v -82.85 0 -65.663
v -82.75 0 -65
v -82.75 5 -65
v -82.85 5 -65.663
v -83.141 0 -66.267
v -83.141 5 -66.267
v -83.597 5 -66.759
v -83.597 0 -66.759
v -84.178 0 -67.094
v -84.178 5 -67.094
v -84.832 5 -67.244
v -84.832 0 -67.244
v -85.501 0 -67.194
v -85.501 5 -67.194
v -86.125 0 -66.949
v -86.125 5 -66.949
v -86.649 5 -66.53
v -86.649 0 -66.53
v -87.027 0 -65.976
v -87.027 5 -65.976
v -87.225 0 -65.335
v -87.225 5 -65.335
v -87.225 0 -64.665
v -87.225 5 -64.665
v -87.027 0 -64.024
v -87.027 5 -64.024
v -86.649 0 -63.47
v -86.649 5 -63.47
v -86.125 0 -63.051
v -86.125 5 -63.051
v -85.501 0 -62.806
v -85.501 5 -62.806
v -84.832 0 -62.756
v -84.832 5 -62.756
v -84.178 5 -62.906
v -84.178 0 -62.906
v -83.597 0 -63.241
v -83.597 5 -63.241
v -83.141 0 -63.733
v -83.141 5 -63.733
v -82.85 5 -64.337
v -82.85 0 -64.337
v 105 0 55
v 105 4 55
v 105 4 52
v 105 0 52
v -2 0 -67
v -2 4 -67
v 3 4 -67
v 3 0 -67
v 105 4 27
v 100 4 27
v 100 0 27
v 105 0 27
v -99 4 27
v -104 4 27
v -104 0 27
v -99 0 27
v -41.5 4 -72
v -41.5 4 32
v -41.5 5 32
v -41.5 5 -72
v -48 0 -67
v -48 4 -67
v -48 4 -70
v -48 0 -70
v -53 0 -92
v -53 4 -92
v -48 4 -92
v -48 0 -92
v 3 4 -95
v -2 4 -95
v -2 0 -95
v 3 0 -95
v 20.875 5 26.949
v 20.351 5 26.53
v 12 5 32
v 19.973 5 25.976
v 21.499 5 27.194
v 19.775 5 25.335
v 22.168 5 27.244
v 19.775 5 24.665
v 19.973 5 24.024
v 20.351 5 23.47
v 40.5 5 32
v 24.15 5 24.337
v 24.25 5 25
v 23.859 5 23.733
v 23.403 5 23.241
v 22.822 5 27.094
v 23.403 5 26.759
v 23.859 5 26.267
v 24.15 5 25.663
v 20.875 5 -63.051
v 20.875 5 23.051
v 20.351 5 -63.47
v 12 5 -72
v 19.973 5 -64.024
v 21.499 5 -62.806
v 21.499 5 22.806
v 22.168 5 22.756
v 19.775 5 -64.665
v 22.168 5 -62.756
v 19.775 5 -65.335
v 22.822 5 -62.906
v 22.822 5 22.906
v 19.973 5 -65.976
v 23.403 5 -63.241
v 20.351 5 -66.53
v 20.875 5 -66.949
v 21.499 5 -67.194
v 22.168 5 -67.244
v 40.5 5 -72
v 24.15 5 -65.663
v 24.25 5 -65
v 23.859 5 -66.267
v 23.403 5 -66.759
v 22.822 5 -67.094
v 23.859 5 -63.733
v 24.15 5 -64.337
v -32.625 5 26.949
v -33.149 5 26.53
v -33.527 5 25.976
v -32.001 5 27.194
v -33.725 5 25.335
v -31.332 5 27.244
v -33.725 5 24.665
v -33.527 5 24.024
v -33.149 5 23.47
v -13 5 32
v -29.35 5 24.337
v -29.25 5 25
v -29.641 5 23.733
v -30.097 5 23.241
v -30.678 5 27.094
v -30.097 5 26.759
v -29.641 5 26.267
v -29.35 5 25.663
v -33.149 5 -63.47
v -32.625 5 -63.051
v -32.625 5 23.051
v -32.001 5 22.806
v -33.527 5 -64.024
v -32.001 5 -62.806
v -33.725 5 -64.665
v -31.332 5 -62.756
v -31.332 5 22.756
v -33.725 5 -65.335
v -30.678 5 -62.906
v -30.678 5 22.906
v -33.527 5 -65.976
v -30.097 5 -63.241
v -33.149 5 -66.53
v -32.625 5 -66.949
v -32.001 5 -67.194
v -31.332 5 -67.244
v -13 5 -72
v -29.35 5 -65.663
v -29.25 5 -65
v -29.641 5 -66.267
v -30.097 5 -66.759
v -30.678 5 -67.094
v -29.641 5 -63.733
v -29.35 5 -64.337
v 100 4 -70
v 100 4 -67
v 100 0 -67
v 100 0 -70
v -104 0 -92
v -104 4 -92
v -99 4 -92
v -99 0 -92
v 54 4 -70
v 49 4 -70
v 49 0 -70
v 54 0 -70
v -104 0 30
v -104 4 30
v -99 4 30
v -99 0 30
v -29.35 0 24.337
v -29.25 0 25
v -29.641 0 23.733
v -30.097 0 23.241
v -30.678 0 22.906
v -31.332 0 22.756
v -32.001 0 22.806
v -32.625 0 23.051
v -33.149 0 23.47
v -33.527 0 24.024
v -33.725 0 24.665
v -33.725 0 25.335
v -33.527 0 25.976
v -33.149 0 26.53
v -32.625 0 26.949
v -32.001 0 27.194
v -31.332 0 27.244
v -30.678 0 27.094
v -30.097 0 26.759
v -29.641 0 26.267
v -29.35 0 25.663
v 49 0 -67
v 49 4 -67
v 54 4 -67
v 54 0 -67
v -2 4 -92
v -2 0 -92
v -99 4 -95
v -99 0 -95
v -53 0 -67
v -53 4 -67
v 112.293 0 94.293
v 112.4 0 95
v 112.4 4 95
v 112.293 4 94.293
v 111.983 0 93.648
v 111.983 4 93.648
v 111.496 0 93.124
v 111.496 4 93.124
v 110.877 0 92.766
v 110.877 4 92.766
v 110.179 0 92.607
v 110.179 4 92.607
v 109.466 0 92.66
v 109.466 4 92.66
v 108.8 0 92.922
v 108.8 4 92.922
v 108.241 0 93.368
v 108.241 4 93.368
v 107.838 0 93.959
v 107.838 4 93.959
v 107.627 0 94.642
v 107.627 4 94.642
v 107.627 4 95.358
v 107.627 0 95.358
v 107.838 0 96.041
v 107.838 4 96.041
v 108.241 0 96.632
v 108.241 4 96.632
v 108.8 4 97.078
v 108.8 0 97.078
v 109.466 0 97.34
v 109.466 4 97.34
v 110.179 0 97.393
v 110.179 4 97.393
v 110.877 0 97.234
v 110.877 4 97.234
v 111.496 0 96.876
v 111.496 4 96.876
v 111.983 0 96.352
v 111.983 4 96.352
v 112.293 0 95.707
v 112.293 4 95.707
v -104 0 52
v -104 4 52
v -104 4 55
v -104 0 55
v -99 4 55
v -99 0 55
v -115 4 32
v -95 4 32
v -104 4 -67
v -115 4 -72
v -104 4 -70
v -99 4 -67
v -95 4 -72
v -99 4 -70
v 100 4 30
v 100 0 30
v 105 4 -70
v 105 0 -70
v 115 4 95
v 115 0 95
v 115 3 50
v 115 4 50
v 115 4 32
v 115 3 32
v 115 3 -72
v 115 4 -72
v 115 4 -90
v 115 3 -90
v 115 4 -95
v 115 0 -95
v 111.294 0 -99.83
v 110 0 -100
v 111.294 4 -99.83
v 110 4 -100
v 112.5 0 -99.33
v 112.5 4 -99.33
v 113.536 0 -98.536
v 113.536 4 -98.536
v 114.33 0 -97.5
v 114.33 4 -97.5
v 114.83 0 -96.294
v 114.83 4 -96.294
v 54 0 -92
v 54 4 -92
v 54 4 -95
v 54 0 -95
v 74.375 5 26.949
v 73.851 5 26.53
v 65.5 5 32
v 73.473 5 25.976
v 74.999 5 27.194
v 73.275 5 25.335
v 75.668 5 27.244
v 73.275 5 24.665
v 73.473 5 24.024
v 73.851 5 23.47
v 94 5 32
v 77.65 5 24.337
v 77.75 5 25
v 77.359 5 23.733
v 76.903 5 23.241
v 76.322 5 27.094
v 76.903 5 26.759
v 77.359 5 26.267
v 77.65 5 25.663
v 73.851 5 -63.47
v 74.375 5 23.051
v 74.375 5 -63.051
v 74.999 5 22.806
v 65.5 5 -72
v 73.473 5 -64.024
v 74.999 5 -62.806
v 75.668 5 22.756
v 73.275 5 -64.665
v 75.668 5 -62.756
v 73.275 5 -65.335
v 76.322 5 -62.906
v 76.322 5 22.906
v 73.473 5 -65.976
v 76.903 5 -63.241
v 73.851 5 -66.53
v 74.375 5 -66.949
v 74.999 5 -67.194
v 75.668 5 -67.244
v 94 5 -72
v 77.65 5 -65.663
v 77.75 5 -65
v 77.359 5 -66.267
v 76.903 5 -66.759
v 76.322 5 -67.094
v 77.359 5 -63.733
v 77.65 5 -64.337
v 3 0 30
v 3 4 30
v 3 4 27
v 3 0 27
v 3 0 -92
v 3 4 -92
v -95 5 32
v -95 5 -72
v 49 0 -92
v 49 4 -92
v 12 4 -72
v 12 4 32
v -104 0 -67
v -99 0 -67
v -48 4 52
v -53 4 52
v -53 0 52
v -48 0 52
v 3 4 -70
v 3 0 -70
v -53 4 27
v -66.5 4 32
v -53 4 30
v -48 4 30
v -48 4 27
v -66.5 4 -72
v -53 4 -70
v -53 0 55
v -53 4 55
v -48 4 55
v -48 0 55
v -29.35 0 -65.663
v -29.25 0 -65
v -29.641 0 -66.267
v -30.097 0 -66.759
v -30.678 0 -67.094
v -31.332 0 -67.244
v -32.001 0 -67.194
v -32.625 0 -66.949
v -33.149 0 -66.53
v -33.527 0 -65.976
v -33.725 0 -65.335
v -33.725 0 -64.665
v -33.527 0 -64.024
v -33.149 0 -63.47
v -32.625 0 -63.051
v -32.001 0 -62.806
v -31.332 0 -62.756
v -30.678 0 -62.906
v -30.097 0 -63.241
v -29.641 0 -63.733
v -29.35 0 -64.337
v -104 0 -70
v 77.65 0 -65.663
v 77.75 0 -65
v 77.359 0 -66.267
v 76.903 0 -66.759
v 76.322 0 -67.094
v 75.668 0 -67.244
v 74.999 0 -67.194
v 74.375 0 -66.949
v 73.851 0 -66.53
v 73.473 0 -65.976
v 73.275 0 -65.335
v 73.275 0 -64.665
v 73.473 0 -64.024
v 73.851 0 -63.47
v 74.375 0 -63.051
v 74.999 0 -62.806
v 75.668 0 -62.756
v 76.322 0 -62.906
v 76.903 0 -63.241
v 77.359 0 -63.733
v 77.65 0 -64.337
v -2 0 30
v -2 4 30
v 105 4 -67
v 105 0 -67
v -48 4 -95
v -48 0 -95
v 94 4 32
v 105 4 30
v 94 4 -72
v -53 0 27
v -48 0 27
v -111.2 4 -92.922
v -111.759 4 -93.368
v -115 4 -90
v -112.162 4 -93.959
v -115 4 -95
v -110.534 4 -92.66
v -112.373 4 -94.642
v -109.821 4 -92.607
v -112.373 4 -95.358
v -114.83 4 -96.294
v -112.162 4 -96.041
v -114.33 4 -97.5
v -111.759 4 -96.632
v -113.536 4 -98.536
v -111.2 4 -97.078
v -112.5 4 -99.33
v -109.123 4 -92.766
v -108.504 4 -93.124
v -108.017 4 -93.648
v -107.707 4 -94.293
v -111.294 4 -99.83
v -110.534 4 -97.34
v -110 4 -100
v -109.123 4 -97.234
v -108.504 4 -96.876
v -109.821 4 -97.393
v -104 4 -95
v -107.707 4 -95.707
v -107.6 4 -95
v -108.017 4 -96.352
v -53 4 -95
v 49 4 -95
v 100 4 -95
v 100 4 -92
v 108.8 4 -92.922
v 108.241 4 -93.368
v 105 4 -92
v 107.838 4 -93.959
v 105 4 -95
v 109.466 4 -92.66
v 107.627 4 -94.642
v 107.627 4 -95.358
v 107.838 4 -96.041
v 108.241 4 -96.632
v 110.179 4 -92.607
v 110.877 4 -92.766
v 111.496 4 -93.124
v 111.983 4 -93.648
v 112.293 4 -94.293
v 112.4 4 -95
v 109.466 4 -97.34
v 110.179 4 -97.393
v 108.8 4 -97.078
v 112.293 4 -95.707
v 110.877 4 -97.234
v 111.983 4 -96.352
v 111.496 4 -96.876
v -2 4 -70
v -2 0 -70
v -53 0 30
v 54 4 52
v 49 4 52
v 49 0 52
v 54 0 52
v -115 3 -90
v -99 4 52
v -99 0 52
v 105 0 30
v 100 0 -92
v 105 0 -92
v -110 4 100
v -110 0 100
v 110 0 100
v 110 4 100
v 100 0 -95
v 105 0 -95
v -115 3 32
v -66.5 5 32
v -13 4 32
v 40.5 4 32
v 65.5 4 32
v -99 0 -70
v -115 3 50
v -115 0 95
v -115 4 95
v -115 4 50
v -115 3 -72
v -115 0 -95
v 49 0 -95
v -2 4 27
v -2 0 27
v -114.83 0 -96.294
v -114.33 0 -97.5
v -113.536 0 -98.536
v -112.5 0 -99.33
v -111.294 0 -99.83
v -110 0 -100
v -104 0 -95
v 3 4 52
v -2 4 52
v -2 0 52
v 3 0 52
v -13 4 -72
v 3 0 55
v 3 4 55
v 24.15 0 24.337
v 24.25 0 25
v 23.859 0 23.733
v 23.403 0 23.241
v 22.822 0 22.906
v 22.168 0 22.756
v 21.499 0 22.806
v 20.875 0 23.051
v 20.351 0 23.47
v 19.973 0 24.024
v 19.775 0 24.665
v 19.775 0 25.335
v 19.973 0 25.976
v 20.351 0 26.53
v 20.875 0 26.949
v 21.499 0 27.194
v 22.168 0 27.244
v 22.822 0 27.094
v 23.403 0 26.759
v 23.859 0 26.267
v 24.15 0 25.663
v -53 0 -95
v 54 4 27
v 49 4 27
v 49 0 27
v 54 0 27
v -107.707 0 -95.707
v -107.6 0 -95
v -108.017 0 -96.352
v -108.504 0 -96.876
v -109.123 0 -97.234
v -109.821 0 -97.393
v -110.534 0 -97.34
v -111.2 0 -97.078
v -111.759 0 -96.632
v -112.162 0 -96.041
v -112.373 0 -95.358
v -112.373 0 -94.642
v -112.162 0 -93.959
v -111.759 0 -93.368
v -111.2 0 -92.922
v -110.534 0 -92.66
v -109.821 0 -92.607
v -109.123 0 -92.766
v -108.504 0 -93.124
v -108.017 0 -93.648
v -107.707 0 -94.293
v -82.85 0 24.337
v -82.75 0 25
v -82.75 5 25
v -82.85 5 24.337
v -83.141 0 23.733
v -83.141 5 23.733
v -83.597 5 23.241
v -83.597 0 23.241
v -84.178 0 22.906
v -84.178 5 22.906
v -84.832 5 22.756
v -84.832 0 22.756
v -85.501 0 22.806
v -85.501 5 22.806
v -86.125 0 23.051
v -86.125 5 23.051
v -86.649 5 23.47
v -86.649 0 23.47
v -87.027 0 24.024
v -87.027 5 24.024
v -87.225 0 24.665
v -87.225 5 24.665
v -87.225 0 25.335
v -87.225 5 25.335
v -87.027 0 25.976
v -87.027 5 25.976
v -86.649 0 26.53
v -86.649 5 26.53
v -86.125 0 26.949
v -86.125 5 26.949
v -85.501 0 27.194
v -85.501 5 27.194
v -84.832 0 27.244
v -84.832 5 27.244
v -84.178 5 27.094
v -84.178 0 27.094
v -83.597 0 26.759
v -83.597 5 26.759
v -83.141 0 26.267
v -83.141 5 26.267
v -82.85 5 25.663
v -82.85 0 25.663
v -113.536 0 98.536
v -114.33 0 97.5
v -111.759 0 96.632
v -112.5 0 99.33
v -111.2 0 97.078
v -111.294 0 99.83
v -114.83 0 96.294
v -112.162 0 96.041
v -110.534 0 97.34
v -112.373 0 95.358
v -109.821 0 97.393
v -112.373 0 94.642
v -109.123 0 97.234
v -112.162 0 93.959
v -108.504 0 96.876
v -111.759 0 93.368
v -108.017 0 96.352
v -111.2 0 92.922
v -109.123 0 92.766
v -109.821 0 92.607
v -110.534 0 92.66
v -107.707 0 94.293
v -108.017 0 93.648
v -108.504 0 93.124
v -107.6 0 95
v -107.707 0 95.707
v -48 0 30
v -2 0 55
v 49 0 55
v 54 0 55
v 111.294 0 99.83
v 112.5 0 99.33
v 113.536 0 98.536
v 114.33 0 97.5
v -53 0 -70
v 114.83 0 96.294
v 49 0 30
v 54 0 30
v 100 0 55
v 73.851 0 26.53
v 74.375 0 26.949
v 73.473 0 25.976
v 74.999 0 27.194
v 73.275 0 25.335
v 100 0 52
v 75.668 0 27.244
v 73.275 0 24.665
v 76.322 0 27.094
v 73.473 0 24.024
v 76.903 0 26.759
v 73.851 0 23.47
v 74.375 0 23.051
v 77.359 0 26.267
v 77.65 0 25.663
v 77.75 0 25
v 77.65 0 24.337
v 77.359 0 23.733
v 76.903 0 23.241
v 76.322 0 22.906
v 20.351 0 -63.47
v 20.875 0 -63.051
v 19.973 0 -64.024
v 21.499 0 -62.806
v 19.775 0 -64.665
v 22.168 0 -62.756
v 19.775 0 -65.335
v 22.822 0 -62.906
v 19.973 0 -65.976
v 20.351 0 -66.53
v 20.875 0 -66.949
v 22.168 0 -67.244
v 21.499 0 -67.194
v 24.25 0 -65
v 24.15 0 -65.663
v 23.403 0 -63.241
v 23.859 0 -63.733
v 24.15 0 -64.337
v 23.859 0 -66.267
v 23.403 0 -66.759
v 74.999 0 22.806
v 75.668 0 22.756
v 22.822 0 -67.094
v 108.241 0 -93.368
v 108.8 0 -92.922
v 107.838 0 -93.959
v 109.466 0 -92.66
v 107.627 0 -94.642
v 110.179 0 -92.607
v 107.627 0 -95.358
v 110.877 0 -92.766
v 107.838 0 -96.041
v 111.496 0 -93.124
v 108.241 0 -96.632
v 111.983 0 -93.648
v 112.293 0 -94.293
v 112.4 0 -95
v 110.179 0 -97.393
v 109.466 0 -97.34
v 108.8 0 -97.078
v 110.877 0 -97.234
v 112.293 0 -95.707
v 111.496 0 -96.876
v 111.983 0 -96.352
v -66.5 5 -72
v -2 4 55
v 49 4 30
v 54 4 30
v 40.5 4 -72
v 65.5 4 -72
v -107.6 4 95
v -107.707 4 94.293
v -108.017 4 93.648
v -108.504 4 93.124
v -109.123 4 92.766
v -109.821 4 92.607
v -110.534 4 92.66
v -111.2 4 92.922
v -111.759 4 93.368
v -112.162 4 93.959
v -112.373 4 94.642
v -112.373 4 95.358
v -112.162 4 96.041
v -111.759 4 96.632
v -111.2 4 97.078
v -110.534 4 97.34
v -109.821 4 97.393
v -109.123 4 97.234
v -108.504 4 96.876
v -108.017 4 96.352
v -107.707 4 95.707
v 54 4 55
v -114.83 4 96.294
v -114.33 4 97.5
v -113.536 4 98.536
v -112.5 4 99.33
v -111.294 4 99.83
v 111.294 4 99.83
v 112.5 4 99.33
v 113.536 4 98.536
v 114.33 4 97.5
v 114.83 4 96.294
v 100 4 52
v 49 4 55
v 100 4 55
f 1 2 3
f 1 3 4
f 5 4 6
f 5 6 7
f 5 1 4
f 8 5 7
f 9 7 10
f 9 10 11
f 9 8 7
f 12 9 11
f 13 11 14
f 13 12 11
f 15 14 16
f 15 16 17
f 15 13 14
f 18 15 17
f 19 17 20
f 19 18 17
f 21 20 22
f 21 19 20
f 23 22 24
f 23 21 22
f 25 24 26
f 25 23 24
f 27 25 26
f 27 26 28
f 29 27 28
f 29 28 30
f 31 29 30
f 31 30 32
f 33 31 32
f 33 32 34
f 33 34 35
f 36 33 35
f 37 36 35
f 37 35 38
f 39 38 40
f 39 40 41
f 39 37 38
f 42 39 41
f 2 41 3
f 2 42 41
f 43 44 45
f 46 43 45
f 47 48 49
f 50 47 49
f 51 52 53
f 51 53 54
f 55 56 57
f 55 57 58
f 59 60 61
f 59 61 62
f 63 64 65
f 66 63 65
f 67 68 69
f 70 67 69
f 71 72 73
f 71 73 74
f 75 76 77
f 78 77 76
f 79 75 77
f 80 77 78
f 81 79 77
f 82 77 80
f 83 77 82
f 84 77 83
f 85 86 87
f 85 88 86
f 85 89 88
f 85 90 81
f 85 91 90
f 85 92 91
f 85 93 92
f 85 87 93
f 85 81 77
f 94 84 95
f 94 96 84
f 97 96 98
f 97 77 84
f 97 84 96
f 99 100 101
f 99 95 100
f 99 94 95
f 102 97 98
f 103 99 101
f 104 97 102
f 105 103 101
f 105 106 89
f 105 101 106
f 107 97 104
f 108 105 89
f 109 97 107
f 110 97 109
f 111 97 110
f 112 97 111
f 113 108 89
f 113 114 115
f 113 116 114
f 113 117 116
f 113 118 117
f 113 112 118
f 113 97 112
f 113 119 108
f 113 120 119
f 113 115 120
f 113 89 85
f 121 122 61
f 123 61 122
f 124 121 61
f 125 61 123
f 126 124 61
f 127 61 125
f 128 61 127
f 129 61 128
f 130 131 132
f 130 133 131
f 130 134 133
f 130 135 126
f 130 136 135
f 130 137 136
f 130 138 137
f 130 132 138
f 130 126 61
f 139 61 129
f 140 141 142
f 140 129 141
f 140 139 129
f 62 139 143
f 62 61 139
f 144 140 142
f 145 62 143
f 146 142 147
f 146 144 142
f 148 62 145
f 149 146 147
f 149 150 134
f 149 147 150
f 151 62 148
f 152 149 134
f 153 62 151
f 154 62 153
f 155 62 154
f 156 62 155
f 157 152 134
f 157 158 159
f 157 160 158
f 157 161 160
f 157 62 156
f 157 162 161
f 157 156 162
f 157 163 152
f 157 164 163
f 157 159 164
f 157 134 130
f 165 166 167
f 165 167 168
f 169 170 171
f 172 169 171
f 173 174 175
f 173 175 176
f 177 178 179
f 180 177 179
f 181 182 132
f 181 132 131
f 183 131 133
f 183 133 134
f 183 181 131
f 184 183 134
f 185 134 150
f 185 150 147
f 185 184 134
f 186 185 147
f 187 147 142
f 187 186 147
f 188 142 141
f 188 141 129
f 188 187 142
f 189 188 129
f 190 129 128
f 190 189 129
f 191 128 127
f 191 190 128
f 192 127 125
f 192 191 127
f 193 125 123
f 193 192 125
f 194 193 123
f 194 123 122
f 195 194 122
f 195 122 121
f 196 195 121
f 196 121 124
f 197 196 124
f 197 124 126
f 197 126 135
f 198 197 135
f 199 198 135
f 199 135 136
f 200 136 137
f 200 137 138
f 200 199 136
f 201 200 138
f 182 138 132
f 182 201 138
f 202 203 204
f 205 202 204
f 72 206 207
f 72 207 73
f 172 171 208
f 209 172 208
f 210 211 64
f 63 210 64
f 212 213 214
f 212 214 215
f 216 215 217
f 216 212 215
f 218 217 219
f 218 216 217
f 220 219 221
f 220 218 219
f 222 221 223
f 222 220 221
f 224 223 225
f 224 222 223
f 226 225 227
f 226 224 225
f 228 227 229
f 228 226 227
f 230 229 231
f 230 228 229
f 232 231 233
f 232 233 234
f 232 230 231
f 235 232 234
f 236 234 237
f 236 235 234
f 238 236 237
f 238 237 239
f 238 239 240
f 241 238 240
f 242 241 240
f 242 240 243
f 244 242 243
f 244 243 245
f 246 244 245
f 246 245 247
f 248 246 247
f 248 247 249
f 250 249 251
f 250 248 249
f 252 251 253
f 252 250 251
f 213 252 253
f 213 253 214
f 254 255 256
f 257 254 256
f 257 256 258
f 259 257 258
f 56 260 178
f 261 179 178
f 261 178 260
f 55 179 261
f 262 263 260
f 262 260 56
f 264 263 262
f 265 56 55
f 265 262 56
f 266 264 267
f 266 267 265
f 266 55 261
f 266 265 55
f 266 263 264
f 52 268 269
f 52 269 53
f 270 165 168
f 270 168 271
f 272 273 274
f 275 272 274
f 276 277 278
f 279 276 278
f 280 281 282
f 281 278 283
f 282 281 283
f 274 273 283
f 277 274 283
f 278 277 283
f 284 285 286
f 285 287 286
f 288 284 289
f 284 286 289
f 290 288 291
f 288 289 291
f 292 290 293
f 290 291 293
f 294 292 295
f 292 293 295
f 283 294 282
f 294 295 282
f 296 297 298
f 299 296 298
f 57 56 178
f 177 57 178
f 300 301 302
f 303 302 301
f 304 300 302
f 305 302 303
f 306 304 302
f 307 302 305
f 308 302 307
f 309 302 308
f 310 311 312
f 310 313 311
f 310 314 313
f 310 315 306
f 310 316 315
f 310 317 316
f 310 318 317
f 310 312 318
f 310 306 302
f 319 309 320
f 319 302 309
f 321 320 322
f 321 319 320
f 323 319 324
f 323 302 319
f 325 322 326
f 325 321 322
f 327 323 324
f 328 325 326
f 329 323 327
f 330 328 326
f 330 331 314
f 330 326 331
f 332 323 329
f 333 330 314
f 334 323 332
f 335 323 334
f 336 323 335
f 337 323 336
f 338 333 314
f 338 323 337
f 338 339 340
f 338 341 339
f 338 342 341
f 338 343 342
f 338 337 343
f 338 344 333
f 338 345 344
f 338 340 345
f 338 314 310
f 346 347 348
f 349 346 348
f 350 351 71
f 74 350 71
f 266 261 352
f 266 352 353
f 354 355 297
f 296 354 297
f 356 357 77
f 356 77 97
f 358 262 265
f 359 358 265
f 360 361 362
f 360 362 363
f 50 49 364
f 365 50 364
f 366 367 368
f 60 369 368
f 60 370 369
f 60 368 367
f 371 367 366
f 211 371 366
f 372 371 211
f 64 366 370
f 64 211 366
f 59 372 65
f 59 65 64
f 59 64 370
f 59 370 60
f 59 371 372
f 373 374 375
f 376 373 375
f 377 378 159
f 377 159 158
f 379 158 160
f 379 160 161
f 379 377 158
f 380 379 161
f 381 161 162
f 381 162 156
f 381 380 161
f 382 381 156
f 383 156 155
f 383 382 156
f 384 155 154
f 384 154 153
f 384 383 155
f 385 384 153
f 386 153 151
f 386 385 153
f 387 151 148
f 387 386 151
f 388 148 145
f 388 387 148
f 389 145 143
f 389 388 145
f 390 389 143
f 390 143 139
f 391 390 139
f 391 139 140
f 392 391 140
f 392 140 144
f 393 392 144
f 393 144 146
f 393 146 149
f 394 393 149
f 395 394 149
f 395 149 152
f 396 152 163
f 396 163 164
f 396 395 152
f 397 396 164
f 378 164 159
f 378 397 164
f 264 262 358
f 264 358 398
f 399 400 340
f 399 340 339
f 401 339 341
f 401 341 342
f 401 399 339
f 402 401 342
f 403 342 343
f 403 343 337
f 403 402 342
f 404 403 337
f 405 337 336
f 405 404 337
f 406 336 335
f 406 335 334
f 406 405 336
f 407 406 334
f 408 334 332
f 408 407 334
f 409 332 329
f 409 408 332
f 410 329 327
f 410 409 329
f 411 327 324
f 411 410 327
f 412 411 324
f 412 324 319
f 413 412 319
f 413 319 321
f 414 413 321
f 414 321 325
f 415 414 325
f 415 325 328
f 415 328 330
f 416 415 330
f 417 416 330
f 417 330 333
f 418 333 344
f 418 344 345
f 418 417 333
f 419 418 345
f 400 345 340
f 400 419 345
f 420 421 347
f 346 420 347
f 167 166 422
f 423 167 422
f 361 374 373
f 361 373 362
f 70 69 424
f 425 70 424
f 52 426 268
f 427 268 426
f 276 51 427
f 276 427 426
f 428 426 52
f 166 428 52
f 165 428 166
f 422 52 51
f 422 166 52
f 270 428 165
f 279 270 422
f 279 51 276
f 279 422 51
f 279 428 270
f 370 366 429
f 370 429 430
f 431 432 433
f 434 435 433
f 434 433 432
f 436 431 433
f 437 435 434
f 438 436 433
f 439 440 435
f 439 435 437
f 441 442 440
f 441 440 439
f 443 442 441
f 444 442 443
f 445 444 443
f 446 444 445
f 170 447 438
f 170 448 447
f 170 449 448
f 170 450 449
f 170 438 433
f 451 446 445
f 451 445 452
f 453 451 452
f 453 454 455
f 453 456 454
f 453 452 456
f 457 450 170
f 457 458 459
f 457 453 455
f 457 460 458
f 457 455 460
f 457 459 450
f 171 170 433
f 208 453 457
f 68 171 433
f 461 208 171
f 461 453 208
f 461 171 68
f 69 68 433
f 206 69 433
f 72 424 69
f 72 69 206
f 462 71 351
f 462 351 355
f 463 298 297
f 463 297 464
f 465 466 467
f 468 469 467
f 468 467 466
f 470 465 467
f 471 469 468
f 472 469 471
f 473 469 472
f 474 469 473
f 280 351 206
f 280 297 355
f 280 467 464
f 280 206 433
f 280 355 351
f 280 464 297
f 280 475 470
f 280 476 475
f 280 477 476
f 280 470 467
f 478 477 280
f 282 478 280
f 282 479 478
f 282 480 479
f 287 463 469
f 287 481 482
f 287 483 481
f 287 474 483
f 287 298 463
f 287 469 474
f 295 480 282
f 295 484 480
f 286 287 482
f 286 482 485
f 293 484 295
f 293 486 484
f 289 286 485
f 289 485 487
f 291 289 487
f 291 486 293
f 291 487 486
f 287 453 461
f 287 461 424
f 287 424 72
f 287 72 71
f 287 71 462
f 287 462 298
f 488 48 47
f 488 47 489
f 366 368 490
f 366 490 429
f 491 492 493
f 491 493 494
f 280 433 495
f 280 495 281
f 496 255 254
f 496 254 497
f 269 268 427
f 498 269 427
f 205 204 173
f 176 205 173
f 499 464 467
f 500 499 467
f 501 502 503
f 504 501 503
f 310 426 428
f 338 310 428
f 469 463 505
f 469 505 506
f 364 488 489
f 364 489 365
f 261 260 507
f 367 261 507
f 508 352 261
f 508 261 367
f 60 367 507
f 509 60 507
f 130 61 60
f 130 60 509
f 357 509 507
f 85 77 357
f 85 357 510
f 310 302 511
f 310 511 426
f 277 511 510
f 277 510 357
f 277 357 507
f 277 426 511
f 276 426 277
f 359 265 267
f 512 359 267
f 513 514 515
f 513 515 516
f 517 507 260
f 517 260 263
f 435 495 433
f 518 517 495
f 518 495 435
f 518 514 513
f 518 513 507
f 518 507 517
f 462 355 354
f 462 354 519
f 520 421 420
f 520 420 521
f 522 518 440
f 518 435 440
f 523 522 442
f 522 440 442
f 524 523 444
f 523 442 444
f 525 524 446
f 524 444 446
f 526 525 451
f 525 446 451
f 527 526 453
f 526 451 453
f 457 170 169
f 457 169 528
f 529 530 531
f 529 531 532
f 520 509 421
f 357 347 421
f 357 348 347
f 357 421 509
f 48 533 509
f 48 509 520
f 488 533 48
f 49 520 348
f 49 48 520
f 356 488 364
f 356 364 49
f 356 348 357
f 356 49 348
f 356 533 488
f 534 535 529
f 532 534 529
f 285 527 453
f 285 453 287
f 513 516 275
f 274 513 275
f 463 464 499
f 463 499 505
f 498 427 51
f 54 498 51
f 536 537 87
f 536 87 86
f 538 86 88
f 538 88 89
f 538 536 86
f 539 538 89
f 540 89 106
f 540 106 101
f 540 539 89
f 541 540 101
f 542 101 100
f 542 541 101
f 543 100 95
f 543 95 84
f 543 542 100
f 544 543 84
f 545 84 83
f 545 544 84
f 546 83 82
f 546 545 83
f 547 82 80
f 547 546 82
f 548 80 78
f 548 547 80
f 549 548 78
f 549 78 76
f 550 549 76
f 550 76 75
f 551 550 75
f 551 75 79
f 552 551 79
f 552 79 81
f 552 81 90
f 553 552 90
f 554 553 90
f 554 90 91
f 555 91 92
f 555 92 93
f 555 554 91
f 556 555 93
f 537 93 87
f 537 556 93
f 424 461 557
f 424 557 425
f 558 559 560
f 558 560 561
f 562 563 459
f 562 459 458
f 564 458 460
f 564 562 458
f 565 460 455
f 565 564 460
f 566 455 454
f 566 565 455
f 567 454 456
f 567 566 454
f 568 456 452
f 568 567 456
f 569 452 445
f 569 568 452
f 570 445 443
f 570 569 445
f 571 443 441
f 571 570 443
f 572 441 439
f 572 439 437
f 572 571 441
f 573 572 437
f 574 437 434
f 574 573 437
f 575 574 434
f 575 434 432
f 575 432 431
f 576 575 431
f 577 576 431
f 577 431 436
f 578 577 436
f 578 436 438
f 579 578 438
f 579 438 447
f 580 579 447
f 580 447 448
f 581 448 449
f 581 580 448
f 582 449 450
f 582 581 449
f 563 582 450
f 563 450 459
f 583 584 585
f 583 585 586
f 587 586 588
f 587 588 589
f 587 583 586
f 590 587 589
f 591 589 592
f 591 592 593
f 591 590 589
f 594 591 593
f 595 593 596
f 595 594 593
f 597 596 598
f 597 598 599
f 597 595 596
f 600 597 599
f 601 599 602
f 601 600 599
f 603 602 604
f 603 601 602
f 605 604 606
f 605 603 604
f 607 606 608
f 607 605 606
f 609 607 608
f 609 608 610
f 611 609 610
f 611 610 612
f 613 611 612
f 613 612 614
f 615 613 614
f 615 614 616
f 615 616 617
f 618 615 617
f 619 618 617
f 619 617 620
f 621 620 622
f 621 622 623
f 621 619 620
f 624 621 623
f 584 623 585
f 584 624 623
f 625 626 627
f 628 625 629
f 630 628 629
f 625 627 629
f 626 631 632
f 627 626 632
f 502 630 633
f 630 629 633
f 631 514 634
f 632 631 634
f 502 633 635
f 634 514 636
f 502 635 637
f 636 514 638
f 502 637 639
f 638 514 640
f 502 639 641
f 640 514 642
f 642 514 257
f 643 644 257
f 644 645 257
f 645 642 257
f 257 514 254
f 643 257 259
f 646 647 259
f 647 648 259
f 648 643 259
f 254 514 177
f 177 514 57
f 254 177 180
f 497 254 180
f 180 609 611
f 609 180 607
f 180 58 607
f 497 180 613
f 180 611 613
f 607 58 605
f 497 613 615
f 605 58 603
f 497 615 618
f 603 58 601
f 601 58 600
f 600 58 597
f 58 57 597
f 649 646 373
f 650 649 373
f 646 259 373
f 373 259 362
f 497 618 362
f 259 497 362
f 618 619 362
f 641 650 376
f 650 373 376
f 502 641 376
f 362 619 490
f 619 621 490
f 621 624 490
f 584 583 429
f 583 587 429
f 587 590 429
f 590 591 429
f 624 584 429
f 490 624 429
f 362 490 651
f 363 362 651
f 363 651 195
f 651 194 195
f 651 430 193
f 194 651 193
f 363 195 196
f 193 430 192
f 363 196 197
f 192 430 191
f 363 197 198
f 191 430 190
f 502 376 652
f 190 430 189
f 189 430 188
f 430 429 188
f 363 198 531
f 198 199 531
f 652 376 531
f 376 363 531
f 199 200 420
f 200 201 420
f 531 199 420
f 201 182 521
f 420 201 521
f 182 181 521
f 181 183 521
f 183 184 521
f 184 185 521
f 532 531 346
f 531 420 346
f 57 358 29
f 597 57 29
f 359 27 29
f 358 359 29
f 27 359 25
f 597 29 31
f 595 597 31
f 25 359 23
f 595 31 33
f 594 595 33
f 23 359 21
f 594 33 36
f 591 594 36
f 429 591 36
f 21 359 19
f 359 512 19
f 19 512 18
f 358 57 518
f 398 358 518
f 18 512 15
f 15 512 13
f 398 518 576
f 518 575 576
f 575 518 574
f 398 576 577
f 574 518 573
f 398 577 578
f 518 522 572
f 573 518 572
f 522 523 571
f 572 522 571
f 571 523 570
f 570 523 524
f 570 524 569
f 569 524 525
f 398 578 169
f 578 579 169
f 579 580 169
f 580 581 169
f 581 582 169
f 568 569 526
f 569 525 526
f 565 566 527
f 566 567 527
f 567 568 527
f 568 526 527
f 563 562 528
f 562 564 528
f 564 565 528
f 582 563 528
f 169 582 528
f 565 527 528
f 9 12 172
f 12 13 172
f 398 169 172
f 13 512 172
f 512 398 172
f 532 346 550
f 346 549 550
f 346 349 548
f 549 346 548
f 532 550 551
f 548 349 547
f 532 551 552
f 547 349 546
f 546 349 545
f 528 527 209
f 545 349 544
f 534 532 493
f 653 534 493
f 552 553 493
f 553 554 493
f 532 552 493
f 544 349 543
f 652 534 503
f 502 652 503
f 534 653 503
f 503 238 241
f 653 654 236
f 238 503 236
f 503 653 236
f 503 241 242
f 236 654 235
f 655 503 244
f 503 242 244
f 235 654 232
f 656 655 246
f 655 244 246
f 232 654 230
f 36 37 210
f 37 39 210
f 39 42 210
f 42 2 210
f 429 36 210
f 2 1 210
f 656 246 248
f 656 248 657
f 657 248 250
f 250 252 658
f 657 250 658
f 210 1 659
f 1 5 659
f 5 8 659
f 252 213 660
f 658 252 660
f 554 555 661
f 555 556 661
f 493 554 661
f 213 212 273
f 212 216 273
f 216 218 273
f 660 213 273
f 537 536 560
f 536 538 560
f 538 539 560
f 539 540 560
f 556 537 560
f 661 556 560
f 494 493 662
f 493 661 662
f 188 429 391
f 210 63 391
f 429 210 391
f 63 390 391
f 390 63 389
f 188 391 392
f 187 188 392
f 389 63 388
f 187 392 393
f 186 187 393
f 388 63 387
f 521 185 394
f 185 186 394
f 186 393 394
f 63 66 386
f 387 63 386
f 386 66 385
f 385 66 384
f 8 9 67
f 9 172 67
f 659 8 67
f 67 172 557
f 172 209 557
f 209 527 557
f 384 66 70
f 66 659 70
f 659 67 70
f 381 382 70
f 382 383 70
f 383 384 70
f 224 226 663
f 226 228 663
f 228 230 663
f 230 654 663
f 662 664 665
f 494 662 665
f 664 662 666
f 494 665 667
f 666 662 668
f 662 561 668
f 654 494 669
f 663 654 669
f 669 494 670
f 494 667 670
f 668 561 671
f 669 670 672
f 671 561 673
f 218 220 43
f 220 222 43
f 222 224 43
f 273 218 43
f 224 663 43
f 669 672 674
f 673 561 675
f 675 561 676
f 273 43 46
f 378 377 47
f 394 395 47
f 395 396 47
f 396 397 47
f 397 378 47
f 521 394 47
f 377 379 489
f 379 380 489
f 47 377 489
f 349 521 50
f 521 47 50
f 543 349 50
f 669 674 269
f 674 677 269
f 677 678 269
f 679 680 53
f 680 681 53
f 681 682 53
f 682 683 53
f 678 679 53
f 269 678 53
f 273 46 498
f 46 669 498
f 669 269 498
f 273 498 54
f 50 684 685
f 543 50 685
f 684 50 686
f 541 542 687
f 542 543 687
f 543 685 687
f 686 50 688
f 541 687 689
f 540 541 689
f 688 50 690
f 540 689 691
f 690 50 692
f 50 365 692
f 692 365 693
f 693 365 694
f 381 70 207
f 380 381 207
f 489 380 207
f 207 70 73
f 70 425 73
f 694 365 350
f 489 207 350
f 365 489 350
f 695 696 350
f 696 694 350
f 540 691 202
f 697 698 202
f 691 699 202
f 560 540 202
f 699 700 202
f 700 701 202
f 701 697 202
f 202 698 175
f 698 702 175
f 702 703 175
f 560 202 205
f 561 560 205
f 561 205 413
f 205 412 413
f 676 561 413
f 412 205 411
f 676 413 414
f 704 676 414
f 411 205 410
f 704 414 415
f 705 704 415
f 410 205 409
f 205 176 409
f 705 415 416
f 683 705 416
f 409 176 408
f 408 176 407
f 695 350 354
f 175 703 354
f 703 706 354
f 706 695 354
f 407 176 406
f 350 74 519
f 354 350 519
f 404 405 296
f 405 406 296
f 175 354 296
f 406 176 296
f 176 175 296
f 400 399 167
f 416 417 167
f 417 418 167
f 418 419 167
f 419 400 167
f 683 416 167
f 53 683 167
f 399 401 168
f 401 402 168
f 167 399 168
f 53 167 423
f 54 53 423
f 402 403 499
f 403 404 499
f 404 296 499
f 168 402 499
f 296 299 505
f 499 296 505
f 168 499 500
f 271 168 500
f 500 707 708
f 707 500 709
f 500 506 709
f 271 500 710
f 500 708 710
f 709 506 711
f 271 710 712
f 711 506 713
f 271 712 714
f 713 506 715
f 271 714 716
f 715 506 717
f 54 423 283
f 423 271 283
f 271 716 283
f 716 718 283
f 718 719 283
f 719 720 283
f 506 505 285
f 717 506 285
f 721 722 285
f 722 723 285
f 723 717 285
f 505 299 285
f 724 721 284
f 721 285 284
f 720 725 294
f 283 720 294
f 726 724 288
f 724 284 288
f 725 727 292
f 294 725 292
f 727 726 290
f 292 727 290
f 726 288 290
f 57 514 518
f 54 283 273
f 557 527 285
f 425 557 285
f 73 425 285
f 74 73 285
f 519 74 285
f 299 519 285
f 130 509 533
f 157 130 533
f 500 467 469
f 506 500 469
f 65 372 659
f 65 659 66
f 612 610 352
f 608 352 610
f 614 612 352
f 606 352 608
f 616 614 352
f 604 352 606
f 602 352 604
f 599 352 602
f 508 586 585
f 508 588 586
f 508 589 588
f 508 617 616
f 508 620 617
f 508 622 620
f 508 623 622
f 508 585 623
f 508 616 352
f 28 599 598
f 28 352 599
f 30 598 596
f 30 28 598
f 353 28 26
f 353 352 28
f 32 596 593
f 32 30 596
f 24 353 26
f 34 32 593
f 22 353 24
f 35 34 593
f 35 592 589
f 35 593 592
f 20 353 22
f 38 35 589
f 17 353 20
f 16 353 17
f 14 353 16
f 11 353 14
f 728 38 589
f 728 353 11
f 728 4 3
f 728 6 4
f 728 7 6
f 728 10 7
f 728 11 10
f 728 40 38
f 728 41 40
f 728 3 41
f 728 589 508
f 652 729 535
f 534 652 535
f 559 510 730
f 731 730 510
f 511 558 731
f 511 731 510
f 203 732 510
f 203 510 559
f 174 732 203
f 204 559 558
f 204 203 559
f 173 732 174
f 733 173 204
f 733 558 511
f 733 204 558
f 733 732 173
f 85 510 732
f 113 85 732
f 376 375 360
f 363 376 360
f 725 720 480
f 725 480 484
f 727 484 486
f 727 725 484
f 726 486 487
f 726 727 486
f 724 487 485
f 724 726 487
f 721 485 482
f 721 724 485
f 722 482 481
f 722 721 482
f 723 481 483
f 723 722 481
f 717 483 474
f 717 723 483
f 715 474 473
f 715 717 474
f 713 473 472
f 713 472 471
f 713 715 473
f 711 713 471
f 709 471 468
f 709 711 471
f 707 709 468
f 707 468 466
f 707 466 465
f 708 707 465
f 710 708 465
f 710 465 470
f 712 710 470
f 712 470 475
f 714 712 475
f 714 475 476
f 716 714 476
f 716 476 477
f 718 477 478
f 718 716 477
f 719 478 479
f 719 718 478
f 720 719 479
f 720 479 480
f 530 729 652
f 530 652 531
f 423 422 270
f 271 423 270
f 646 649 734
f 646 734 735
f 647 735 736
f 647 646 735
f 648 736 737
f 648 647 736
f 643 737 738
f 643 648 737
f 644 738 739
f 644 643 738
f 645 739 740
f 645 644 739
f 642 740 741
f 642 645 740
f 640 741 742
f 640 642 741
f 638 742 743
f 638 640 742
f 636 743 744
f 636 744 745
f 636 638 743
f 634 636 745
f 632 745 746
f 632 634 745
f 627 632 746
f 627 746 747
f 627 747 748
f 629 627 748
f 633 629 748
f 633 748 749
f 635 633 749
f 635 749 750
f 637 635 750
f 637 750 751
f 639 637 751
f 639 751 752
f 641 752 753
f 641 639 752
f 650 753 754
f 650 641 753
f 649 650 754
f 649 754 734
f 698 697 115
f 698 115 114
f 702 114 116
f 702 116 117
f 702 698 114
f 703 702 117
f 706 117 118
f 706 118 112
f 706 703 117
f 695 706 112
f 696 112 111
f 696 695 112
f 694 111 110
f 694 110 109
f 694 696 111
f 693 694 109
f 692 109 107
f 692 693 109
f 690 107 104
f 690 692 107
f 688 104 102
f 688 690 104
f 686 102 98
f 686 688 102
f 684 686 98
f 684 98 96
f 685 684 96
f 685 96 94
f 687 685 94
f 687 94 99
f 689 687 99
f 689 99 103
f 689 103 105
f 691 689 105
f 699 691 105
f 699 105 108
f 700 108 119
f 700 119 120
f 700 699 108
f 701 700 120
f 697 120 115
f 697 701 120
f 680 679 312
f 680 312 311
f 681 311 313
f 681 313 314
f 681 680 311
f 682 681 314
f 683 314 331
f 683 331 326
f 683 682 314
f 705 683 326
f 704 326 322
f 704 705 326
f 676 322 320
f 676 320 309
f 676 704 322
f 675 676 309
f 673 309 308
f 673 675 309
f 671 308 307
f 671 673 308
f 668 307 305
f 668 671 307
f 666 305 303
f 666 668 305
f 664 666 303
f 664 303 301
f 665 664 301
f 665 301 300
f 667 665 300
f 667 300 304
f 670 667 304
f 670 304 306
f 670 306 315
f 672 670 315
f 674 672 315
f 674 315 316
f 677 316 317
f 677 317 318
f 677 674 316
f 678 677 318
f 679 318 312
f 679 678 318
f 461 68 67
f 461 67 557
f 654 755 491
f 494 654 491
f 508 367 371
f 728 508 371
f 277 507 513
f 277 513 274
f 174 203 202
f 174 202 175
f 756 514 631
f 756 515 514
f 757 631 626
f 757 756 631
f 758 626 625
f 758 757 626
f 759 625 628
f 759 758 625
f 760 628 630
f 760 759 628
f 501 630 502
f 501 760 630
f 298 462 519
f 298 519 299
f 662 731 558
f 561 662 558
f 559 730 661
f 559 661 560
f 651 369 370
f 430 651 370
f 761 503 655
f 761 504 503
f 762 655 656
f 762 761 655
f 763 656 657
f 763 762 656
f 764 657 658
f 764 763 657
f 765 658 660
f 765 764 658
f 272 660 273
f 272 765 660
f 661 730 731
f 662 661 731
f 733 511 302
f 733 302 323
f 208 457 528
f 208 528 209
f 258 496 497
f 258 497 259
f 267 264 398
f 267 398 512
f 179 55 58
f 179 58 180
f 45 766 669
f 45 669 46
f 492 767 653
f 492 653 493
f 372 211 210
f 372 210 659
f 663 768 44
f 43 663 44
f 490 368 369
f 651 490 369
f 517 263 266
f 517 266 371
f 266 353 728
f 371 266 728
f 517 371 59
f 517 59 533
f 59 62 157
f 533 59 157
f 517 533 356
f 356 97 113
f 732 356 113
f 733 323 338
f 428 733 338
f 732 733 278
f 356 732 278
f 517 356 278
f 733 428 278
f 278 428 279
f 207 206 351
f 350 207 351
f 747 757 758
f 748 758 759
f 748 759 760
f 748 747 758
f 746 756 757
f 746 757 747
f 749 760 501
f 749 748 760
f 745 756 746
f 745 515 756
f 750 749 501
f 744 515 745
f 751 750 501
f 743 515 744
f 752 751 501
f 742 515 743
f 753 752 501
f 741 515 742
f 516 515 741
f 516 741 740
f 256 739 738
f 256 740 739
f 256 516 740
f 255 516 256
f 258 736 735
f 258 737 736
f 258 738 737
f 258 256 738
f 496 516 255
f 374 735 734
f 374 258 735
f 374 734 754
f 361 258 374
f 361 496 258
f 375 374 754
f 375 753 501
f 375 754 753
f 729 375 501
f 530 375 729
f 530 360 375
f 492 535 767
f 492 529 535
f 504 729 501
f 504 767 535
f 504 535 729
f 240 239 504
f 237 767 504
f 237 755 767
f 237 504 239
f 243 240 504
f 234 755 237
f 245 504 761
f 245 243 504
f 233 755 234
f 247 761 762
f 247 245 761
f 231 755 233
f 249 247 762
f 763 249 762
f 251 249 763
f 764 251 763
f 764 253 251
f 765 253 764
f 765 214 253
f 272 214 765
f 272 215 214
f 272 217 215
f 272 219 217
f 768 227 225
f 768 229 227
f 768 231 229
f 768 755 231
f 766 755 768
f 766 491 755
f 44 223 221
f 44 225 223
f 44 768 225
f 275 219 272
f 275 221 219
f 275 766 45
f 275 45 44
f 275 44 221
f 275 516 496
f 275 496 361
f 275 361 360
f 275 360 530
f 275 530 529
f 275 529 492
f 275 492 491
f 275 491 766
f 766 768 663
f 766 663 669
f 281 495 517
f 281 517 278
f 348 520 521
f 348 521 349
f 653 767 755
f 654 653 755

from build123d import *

# Parameters (mm, degrees)
BODY_SKETCH_W                          = 230
BODY_SKETCH_H                          = 200
BODY_DEPTH                             = 4
MOUNTING_HOLES_OUTLINE_R               = 2.4
MOUNTING_HOLES_DEPTH                   = 4
SKETCH4_W                              = 230
SKETCH4_H                              = 18
CABLE_CUTOUTS_DEPTH                    = 1
SKETCH6_W                              = 28.5
SKETCH6_H                              = 104
DRIVER_EXTRUSION_DEPTH                 = 1
DRIVER_MOUNTING_HOLES_OUTLINE_R        = 2.25
DRIVER_MOUNTING_HOLES_DEPTH            = 5
DRIVER_PATTERN_COUNT                   = 4
DRIVER_PATTERN_PITCH                   = 53.5
SKETCH9_W                              = 5
SKETCH9_H                              = 3
CABLE_FIXIATOR_CUTOUT_DEPTH            = 153.449991801
CABLE_FIXIATOR_PATTERN_COUNT           = 5
CABLE_FIXIATOR_PATTERN_PITCH           = 51
CABLE_FIXIATOR_PATTERN_COPY_1_SKETCH_W = 5
CABLE_FIXIATOR_PATTERN_COPY_1_SKETCH_H = 3
CABLE_FIXIATOR_PATTERN_COPY_1_DEPTH    = 153.449991801
CABLE_FIXIATOR_PATTERN_COPY_2_SKETCH_W = 5
CABLE_FIXIATOR_PATTERN_COPY_2_SKETCH_H = 3
CABLE_FIXIATOR_PATTERN_COPY_2_DEPTH    = 153.449991801
CABLE_FIXIATOR_PATTERN_COPY_3_SKETCH_W = 5
CABLE_FIXIATOR_PATTERN_COPY_3_SKETCH_H = 3
CABLE_FIXIATOR_PATTERN_COPY_3_DEPTH    = 153.449991801
CABLE_FIXIATOR_PATTERN_COPY_4_SKETCH_W = 5
CABLE_FIXIATOR_PATTERN_COPY_4_SKETCH_H = 3
CABLE_FIXIATOR_PATTERN_COPY_4_DEPTH    = 153.449991801
EDGE_FILLETS_R                         = 5


# Read off the part's stored shape, not the designer's step: mounting_holes, driver_mounting_holes
with BuildPart() as part:
    # body_sketch → body (new body)
    with BuildSketch(Plane(origin=(0, 0, 0), x_dir=(1, 0, 0), z_dir=(0, 1, 0))):
        Rectangle(BODY_SKETCH_W, BODY_SKETCH_H)
    extrude(amount=BODY_DEPTH)

    # mounting_holes outline → mounting_holes (cut)
    with BuildSketch(Plane(origin=(0, 0, 0), x_dir=(1, 0, 0), z_dir=(0, 1, 0))):
        with Locations((110, -95)):
            Circle(MOUNTING_HOLES_OUTLINE_R)
        with Locations((-110, 95)):
            Circle(MOUNTING_HOLES_OUTLINE_R)
        with Locations((-110, -95)):
            Circle(MOUNTING_HOLES_OUTLINE_R)
        with Locations((110, 95)):
            Circle(MOUNTING_HOLES_OUTLINE_R)
    extrude(amount=MOUNTING_HOLES_DEPTH, mode=Mode.SUBTRACT)

    # Sketch4 → cable_cutouts (cut)
    with BuildSketch(Plane(origin=(0, 4, 0), x_dir=(1, 0, 0), z_dir=(0, 1, 0))):
        with Locations((0, 81)):
            Rectangle(SKETCH4_W, SKETCH4_H)
        with Locations((0, -41)):
            Rectangle(SKETCH4_W, SKETCH4_H)
    extrude(amount=-CABLE_CUTOUTS_DEPTH, mode=Mode.SUBTRACT)

    # Sketch6 → driver_extrusion (add)
    with BuildSketch(Plane(origin=(0, 4, 0), x_dir=(1, 0, 0), z_dir=(0, 1, 0))):
        with Locations((-80.75, 20)):
            Rectangle(SKETCH6_W, SKETCH6_H)
    driver_extrusion = extrude(amount=DRIVER_EXTRUSION_DEPTH)

    # driver_mounting_holes outline → driver_mounting_holes (cut)
    with BuildSketch(Plane(origin=(0, 0, 0), x_dir=(1, 0, 0), z_dir=(0, 1, 0))):
        with Locations((-85, -25)):
            Circle(DRIVER_MOUNTING_HOLES_OUTLINE_R)
        with Locations((-85, 65)):
            Circle(DRIVER_MOUNTING_HOLES_OUTLINE_R)
    driver_mounting_holes = extrude(amount=DRIVER_MOUNTING_HOLES_DEPTH, mode=Mode.SUBTRACT)

    # driver_pattern: driver_extrusion, driver_mounting_holes ×4
    with Locations(*[(i * DRIVER_PATTERN_PITCH, 0, 0) for i in range(1, DRIVER_PATTERN_COUNT)]):
        add(driver_extrusion)
        add(driver_mounting_holes, mode=Mode.SUBTRACT)

    # Sketch9 → cable_fixiator_cutout (cut, through all)
    with BuildSketch(Plane(origin=(0, 4, 0), x_dir=(1, 0, 0), z_dir=(0, 1, 0))):
        with Locations((-101.5, 93.5)):
            Rectangle(SKETCH9_W, SKETCH9_H)
        with Locations((-101.5, 68.5)):
            Rectangle(SKETCH9_W, SKETCH9_H)
    cable_fixiator_cutout = extrude(amount=-CABLE_FIXIATOR_CUTOUT_DEPTH, mode=Mode.SUBTRACT)

    # cable_fixiator_mirror: cable_fixiator_cutout across plane
    add(cable_fixiator_cutout.mirror(Plane.XY.offset(-20)), mode=Mode.SUBTRACT)

    # cable_fixiator_pattern: cable_fixiator_cutout ×5
    with Locations(*[(i * CABLE_FIXIATOR_PATTERN_PITCH, 0, 0) for i in range(1, CABLE_FIXIATOR_PATTERN_COUNT)]):
        add(cable_fixiator_cutout, mode=Mode.SUBTRACT)

    # cable_fixiator_pattern copy 1 sketch → cable_fixiator_pattern copy 1 (cut, through all)
    with BuildSketch(Plane(origin=(51, 4, -40), x_dir=(1, 0, 0), z_dir=(0, 1, 0))):
        with Locations((-101.5, -93.5)):
            Rectangle(CABLE_FIXIATOR_PATTERN_COPY_1_SKETCH_W, CABLE_FIXIATOR_PATTERN_COPY_1_SKETCH_H)
        with Locations((-101.5, -68.5)):
            Rectangle(CABLE_FIXIATOR_PATTERN_COPY_1_SKETCH_W, CABLE_FIXIATOR_PATTERN_COPY_1_SKETCH_H)
    extrude(amount=-CABLE_FIXIATOR_PATTERN_COPY_1_DEPTH, mode=Mode.SUBTRACT)

    # cable_fixiator_pattern copy 2 sketch → cable_fixiator_pattern copy 2 (cut, through all)
    with BuildSketch(Plane(origin=(102, 4, -40), x_dir=(1, 0, 0), z_dir=(0, 1, 0))):
        with Locations((-101.5, -93.5)):
            Rectangle(CABLE_FIXIATOR_PATTERN_COPY_2_SKETCH_W, CABLE_FIXIATOR_PATTERN_COPY_2_SKETCH_H)
        with Locations((-101.5, -68.5)):
            Rectangle(CABLE_FIXIATOR_PATTERN_COPY_2_SKETCH_W, CABLE_FIXIATOR_PATTERN_COPY_2_SKETCH_H)
    extrude(amount=-CABLE_FIXIATOR_PATTERN_COPY_2_DEPTH, mode=Mode.SUBTRACT)

    # cable_fixiator_pattern copy 3 sketch → cable_fixiator_pattern copy 3 (cut, through all)
    with BuildSketch(Plane(origin=(153, 4, -40), x_dir=(1, 0, 0), z_dir=(0, 1, 0))):
        with Locations((-101.5, -93.5)):
            Rectangle(CABLE_FIXIATOR_PATTERN_COPY_3_SKETCH_W, CABLE_FIXIATOR_PATTERN_COPY_3_SKETCH_H)
        with Locations((-101.5, -68.5)):
            Rectangle(CABLE_FIXIATOR_PATTERN_COPY_3_SKETCH_W, CABLE_FIXIATOR_PATTERN_COPY_3_SKETCH_H)
    extrude(amount=-CABLE_FIXIATOR_PATTERN_COPY_3_DEPTH, mode=Mode.SUBTRACT)

    # cable_fixiator_pattern copy 4 sketch → cable_fixiator_pattern copy 4 (cut, through all)
    with BuildSketch(Plane(origin=(204, 4, -40), x_dir=(1, 0, 0), z_dir=(0, 1, 0))):
        with Locations((-101.5, -93.5)):
            Rectangle(CABLE_FIXIATOR_PATTERN_COPY_4_SKETCH_W, CABLE_FIXIATOR_PATTERN_COPY_4_SKETCH_H)
        with Locations((-101.5, -68.5)):
            Rectangle(CABLE_FIXIATOR_PATTERN_COPY_4_SKETCH_W, CABLE_FIXIATOR_PATTERN_COPY_4_SKETCH_H)
    extrude(amount=-CABLE_FIXIATOR_PATTERN_COPY_4_DEPTH, mode=Mode.SUBTRACT)

    # edge_fillets
    edge_fillets_edges = [part.edges().sort_by_distance(p)[0] for p in [
        (115, 2, 100),
        (-115, 2, 100),
        (-115, 2, -100),
        (115, 2, -100),
    ]]
    fillet(edge_fillets_edges, radius=EDGE_FILLETS_R)


solid = part.part
